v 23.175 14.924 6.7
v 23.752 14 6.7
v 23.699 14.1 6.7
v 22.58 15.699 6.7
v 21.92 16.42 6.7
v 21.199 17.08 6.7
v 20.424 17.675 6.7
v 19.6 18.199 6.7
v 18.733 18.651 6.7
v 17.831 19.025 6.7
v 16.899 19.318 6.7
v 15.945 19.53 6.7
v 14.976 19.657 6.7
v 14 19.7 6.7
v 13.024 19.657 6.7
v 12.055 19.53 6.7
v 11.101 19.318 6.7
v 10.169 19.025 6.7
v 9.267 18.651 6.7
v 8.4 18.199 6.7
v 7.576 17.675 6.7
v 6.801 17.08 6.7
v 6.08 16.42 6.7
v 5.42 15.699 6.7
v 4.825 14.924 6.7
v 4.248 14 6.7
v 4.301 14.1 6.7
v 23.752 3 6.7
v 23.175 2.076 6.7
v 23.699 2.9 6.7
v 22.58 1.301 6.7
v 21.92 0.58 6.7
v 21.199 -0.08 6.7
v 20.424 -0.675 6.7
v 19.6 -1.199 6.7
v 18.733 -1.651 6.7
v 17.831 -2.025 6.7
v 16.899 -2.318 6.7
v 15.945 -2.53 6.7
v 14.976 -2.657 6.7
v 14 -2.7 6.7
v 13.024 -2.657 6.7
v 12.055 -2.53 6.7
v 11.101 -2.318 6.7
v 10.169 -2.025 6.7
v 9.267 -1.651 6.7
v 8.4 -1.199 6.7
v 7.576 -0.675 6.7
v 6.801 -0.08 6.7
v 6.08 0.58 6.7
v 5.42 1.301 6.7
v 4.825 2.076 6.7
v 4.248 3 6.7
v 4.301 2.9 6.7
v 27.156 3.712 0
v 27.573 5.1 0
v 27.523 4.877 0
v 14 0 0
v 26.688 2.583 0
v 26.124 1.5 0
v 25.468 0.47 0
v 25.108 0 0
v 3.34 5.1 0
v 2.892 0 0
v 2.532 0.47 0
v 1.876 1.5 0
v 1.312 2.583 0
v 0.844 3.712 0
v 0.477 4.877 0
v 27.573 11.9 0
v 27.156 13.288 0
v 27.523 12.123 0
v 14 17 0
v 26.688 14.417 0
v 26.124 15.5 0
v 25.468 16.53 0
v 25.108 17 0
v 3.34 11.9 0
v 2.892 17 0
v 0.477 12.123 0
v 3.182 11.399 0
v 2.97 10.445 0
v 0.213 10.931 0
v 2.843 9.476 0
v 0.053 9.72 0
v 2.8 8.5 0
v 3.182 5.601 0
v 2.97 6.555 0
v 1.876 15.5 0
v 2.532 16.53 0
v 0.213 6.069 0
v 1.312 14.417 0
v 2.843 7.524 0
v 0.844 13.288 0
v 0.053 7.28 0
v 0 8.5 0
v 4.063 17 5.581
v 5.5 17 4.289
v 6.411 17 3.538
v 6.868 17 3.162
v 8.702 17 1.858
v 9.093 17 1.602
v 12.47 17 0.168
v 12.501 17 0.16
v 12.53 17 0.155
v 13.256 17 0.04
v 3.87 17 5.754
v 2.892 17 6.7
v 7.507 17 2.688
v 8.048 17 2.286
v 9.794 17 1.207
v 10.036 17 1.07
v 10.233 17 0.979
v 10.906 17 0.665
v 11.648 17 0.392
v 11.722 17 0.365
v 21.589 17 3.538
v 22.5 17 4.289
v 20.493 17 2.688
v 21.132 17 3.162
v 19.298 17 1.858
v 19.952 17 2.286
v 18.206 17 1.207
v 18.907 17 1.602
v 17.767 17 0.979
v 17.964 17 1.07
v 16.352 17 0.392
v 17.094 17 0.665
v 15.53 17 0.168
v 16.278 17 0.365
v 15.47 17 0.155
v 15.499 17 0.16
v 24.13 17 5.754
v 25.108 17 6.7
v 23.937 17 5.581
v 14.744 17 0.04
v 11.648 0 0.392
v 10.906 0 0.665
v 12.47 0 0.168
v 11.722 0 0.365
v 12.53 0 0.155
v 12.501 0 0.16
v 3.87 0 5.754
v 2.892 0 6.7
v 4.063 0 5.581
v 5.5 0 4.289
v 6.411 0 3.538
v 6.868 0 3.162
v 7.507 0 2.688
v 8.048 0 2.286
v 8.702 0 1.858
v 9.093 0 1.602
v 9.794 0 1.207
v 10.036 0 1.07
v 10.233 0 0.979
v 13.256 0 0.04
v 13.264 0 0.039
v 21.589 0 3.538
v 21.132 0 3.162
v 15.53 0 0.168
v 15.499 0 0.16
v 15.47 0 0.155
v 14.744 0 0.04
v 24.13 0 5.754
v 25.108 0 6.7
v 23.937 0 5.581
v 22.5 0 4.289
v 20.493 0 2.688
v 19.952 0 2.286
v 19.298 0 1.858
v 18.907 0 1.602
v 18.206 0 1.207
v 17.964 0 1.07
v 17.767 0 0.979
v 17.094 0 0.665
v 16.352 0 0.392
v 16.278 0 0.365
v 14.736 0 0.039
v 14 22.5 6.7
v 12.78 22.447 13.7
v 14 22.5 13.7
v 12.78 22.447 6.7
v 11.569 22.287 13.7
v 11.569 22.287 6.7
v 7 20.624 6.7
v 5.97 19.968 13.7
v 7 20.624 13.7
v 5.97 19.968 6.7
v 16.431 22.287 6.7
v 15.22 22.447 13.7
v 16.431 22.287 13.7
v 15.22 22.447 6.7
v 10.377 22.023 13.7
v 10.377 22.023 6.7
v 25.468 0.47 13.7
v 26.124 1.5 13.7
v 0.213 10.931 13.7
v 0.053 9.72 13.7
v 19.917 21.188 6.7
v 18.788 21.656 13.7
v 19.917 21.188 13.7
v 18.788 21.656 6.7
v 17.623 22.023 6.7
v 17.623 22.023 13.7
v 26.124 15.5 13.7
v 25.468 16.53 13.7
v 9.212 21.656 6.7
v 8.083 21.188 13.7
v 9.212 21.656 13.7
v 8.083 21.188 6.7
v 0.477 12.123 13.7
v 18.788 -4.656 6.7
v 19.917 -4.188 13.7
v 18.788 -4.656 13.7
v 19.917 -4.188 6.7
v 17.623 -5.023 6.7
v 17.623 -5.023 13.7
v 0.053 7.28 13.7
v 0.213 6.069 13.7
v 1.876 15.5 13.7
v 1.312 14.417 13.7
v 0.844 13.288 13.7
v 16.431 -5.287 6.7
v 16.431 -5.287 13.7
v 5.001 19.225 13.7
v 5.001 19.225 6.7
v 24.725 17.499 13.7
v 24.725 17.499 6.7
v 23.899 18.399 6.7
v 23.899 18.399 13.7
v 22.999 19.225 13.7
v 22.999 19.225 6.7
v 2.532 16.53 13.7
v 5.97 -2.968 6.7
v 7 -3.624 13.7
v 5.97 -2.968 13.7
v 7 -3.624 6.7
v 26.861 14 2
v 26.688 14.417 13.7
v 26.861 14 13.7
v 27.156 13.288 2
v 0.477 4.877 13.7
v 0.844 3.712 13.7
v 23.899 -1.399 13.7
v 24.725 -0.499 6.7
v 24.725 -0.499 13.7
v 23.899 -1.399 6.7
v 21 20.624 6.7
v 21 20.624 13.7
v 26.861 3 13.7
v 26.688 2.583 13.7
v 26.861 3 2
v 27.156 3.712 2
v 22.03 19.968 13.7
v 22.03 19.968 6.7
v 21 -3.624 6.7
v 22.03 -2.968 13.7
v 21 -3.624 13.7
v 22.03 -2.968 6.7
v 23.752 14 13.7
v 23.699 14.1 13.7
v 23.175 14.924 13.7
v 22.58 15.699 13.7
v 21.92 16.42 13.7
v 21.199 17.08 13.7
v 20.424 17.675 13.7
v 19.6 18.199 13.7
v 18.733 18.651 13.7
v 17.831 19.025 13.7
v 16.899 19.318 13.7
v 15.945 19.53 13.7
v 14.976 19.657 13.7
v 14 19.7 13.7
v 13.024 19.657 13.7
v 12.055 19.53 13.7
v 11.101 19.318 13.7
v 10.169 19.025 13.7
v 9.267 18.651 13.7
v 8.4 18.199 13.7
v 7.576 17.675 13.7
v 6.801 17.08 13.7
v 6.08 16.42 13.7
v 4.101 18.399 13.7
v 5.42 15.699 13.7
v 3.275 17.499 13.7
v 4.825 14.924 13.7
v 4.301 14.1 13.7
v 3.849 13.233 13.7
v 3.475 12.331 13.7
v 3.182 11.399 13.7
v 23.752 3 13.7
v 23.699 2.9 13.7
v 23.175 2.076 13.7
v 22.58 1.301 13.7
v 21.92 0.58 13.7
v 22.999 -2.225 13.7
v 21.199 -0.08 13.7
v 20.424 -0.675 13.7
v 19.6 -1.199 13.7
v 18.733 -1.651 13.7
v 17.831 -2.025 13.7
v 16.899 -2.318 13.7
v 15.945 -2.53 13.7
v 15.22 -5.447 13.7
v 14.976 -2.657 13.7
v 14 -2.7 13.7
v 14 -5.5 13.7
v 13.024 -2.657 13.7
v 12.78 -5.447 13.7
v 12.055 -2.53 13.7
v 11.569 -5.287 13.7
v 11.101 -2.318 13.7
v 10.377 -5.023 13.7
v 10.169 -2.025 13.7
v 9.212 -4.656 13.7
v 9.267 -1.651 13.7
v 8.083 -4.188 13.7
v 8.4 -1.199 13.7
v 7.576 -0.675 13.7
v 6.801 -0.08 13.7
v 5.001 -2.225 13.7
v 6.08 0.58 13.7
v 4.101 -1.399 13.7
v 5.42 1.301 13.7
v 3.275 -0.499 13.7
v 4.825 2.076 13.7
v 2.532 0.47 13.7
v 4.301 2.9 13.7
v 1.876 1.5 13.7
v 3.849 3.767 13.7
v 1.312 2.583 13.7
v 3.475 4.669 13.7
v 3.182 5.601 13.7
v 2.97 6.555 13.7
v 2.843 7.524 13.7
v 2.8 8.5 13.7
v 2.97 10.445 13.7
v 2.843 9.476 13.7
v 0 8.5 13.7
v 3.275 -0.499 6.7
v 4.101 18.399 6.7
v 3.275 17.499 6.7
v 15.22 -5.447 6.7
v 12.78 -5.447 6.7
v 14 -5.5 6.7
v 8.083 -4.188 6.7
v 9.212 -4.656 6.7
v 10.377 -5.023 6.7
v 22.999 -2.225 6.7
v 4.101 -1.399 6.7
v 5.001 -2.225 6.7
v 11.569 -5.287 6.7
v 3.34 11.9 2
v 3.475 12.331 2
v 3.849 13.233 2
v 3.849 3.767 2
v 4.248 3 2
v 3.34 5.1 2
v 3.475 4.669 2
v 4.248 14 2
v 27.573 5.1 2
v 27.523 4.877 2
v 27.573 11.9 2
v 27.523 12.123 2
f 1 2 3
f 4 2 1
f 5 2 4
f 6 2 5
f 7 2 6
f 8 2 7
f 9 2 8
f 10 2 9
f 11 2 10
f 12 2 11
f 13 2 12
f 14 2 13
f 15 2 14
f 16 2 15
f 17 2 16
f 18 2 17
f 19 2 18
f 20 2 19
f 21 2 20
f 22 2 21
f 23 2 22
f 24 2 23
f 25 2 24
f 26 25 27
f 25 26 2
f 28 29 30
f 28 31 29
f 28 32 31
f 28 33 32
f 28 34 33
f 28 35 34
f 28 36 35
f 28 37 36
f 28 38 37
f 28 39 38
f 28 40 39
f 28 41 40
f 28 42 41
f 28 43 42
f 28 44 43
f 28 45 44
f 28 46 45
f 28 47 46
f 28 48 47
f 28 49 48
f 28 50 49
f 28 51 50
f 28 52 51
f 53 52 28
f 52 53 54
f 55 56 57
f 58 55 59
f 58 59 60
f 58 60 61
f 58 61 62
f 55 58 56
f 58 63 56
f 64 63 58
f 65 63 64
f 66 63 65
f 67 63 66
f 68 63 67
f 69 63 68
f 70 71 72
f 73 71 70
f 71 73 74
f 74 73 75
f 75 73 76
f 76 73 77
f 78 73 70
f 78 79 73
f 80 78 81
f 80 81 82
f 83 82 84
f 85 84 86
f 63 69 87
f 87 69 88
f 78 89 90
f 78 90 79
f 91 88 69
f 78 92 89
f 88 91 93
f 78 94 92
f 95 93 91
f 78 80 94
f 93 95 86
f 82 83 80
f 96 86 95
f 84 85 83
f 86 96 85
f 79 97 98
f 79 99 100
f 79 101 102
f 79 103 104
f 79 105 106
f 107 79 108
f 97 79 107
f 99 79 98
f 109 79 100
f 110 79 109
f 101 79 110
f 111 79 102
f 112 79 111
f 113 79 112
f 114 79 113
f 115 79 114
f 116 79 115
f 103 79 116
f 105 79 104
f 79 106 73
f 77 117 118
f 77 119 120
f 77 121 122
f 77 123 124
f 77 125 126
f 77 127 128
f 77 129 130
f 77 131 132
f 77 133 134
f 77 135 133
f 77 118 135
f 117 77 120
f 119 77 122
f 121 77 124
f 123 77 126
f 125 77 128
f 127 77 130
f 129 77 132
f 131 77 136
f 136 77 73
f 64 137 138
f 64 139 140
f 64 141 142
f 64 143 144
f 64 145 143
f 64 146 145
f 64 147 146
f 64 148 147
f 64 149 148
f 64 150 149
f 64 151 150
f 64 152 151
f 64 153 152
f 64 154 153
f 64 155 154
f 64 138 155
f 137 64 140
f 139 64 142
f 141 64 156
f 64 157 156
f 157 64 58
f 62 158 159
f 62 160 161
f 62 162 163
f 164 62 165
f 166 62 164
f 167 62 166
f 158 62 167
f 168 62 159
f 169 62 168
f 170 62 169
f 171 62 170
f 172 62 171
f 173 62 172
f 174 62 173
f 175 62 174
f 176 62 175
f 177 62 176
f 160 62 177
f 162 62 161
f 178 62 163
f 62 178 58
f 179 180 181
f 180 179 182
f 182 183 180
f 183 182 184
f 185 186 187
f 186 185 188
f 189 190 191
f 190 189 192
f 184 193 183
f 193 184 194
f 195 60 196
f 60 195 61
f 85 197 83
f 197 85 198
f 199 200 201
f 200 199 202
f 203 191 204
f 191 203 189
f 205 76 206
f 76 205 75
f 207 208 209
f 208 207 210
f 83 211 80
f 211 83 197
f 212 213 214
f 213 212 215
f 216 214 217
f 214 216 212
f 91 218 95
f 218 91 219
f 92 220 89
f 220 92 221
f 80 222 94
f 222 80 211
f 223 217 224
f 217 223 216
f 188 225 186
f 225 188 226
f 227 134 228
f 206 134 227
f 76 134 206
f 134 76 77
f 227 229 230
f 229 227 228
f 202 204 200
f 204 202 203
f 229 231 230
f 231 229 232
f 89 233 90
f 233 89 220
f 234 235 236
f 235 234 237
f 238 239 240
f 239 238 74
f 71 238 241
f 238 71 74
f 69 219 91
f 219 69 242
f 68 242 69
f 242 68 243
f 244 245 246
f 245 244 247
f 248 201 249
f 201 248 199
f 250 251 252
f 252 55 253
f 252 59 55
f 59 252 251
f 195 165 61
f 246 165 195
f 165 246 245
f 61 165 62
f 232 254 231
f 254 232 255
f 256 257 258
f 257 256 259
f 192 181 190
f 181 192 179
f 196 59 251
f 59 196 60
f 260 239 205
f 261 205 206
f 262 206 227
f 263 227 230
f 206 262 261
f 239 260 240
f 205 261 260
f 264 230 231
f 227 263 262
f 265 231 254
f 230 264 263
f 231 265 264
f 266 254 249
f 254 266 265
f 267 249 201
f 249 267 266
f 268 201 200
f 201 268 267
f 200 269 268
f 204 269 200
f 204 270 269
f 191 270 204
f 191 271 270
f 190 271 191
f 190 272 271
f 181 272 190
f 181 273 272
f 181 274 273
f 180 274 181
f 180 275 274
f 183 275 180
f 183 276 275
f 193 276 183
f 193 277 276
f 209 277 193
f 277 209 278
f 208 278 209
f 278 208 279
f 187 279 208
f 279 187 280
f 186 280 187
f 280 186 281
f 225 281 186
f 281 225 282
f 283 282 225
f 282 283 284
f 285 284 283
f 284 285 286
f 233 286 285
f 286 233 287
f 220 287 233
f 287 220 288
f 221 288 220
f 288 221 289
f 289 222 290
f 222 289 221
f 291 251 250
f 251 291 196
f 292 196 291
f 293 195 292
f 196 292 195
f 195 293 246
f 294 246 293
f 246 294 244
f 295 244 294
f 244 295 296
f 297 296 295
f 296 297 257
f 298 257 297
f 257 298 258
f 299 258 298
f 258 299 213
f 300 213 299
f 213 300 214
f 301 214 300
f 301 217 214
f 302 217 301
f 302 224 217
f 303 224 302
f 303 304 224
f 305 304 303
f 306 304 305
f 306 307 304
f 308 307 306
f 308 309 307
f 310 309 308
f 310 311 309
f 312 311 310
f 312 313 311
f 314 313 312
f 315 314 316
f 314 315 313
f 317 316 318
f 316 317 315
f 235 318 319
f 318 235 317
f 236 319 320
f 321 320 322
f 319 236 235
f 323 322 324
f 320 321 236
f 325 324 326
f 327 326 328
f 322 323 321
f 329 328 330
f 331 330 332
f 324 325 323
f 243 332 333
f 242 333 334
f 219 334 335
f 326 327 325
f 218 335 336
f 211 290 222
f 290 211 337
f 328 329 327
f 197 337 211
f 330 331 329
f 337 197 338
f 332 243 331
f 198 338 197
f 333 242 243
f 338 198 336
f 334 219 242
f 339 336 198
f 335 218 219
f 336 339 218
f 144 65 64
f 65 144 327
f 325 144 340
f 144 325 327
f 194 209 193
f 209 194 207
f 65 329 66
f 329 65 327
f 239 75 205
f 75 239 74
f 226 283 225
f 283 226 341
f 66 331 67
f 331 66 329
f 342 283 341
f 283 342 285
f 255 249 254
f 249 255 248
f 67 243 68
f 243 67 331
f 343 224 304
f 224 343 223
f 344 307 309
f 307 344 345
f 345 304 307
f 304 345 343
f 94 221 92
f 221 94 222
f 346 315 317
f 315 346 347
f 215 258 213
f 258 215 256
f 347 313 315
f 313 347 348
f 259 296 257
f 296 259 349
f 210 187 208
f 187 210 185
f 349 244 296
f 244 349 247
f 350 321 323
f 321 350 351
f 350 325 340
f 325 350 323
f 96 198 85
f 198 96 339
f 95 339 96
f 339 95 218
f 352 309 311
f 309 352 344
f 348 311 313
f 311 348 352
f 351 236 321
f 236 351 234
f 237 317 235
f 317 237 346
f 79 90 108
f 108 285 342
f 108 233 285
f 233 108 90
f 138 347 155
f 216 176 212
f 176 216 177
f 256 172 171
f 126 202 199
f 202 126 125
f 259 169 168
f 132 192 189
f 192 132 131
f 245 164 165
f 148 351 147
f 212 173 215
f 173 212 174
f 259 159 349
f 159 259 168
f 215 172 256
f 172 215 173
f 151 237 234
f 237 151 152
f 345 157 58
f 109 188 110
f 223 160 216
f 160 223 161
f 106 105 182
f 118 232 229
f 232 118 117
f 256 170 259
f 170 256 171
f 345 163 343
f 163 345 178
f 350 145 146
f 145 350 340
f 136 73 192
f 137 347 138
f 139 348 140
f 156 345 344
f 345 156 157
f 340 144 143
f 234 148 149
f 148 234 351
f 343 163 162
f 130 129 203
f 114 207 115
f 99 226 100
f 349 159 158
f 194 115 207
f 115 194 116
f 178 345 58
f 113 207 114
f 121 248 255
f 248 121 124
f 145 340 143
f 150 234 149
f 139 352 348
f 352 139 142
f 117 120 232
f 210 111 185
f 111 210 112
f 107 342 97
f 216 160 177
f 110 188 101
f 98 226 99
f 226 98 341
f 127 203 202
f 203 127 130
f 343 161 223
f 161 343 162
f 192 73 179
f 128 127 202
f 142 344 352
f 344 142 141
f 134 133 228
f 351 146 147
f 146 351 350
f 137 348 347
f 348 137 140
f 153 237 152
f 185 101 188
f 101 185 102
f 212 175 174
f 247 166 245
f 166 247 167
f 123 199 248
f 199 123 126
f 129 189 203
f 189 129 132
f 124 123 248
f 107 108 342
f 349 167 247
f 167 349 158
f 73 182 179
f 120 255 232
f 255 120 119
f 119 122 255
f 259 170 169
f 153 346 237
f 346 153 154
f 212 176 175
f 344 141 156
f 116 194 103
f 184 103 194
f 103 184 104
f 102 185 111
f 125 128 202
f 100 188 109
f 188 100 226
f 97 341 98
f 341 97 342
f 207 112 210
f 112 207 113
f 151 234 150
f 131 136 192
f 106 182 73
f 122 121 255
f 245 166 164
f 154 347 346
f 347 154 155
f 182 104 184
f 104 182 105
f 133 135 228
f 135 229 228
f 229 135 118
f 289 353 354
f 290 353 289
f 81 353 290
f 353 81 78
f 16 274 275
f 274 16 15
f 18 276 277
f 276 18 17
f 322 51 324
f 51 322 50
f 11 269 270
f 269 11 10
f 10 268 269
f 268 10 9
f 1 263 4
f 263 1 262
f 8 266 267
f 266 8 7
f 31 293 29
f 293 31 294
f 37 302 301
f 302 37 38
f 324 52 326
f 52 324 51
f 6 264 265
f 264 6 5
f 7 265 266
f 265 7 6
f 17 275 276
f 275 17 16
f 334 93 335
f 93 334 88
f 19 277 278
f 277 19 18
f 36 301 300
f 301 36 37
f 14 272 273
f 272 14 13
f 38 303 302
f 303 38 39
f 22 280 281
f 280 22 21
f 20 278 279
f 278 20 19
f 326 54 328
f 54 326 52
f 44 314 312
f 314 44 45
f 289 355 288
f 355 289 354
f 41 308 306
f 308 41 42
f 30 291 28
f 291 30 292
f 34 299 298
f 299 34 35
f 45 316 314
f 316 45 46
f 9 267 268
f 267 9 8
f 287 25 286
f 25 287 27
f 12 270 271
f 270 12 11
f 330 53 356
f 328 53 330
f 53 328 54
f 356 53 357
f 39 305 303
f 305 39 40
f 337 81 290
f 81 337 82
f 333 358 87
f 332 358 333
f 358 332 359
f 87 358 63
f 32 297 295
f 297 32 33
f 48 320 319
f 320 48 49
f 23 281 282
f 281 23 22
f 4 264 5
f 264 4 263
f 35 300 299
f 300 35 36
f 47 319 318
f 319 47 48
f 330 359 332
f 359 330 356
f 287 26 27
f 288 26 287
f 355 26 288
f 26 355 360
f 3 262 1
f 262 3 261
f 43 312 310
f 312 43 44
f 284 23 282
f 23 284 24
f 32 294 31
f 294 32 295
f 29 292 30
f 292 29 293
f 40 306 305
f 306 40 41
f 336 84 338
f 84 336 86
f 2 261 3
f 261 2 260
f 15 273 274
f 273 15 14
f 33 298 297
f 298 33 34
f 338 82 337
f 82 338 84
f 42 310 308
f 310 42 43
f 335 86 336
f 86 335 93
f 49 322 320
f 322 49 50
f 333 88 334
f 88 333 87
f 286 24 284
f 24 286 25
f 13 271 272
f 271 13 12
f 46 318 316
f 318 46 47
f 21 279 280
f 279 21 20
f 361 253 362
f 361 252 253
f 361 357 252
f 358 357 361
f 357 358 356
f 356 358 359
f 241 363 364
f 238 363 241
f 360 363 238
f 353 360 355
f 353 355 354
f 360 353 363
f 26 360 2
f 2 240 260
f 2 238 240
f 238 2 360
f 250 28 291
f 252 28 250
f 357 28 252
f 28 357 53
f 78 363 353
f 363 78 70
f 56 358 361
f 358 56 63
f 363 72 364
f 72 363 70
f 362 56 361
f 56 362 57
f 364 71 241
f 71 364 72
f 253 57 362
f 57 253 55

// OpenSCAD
Gap = 0.2;
$fn = 72;

FrameToBearing();

module FrameToBearing() {
    BearingRadius = 11.0;
    BearingHeight = 7.0;
    Thickness = 3.0;
    MountingRadius = BearingRadius + Thickness;

    HeadDiameter = 11.0;
    HeadHeight = 4.5 + Gap;

    ThreadDiameter = 6.6 + Gap; // I measured 6.2, but RodToBearingCoupling uses 6.5 for a snug fit
    ThreadHeight = 2.0;

    FrameAdapterWidth = HeadDiameter + 2*Thickness;
    FrameAdapterLength = MountingRadius*2;
    FrameAdapterHeight = ThreadHeight + HeadHeight;

    ToTheSky = 50;

    intersection()
    {
        // Enclose everything in the radius of bearing adapter
        translate([FrameAdapterLength/2, FrameAdapterWidth/2, 0])
            cylinder(r = MountingRadius, h=ToTheSky, center=false);
        union()
        {
            difference() {
                union() {
                    // Frame adapter
                    cube([FrameAdapterLength, FrameAdapterWidth, FrameAdapterHeight]);
                    // Bearing adapter
                    translate([FrameAdapterLength/2, FrameAdapterWidth/2, FrameAdapterHeight])
                        cylinder(r = MountingRadius, h=BearingHeight, center=false);
                    // Their connection
                    translate([FrameAdapterLength/2, FrameAdapterWidth/2, 0])
                        cylinder(r2 = MountingRadius, r1=FrameAdapterWidth/2, h=FrameAdapterHeight, center=false);
                }
                union() {
                    // Volume of bearing
                    translate([FrameAdapterLength/2, FrameAdapterWidth/2, FrameAdapterHeight])
                        cylinder(r = BearingRadius + Gap, h=BearingHeight);
                    
                    // Volume of the nut head
                    translate([0, Thickness, ThreadHeight])
                        cube([FrameAdapterLength, HeadDiameter, HeadHeight]);

                    // Volume of the nut thread
                    translate([0, Thickness + (HeadDiameter - ThreadDiameter)/2, 0])
                        cube([FrameAdapterLength, ThreadDiameter, ThreadHeight]);

                    // Don't fully enclose the bearing at x=Length
                    translate([FrameAdapterLength/2, Thickness, ThreadHeight])
                        cube([FrameAdapterLength, HeadDiameter, HeadHeight + ToTheSky]);
                }
            }
            // Additional support wall at x=0
            intersection()
            {
                // Cylindrical wall
                difference()
                {
                    translate([FrameAdapterLength/2, FrameAdapterWidth/2, 0])
                        cylinder(r = MountingRadius, h=FrameAdapterHeight, center=false);
                    translate([FrameAdapterLength/2, FrameAdapterWidth/2, 0])
                        cylinder(r = BearingRadius + Gap, h=BearingHeight);
                }
                translate([0, Thickness, 0])
                    cube([FrameAdapterLength/2, HeadDiameter, HeadHeight + ToTheSky]);                
            }
        }
    }
}
